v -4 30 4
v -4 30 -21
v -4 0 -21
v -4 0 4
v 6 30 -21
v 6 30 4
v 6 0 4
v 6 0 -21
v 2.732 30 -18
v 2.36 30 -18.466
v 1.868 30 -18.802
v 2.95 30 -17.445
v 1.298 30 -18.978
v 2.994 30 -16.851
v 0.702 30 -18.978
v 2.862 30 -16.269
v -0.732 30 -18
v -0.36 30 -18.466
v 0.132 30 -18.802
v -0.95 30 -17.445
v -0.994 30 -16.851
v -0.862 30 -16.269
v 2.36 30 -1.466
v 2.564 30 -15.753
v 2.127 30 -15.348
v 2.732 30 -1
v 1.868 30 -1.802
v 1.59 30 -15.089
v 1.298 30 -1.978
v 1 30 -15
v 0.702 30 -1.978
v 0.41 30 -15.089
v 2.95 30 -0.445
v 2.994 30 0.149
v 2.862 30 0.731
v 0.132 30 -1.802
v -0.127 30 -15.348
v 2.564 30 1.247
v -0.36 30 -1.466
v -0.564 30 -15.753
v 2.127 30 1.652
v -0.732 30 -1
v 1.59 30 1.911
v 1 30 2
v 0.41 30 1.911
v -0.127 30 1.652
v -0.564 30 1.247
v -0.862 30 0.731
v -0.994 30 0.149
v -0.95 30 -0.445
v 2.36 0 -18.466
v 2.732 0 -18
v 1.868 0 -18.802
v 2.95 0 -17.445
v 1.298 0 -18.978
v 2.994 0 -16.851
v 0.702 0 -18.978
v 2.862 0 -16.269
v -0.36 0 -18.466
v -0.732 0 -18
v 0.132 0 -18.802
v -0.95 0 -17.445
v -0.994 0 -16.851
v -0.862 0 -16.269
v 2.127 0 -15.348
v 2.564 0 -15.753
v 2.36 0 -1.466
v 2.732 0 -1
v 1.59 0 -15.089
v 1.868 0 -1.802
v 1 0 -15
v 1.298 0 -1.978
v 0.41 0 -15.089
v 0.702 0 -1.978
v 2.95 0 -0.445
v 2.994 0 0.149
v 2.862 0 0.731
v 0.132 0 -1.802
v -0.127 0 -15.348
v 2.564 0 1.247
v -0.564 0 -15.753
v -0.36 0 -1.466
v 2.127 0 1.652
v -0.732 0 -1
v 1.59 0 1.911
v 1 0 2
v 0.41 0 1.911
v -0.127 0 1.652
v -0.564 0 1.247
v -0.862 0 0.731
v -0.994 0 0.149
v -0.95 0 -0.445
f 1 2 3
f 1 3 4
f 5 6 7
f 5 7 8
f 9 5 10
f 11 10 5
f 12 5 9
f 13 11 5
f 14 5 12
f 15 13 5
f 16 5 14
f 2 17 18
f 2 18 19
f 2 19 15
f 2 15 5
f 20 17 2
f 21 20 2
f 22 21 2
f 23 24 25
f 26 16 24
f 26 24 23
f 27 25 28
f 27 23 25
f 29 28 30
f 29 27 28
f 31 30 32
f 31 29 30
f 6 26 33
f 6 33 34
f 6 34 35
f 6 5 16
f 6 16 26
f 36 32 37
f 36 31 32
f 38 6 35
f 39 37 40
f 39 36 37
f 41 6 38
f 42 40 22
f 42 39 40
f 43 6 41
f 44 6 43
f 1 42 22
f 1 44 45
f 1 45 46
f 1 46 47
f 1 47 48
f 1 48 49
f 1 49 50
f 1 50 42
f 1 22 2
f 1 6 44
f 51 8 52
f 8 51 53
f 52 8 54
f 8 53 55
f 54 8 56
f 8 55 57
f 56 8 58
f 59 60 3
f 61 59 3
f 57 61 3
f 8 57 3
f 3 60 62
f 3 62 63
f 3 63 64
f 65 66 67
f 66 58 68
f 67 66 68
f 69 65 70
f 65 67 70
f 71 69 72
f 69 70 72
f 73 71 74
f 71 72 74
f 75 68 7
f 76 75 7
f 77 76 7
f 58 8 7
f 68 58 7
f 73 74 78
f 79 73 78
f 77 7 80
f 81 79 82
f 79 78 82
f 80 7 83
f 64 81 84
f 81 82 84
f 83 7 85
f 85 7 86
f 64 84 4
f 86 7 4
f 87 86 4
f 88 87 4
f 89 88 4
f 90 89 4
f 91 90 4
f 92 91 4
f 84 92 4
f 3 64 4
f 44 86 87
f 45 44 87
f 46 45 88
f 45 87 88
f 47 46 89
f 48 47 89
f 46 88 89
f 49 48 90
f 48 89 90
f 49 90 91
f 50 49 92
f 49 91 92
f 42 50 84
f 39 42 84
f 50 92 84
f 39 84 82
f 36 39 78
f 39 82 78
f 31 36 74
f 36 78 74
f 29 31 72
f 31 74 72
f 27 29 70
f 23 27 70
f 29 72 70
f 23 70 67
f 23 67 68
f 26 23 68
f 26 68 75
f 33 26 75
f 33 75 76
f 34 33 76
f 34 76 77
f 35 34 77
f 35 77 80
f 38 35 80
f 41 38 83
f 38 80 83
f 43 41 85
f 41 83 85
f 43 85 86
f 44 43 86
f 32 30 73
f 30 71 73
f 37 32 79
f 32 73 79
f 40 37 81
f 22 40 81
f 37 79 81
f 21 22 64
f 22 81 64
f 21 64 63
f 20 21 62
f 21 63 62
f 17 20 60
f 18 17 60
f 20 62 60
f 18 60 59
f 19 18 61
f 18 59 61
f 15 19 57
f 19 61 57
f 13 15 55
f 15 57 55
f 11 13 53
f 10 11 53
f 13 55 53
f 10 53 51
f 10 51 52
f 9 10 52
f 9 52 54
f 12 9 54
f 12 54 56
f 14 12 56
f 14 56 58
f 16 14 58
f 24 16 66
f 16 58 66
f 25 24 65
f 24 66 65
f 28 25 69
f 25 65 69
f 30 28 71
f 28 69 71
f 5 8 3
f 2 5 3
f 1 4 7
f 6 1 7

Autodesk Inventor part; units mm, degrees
ref_plane "YZ Plane" through (0, 0, 0) normal (1, 0, 0) x (0, 1, 0)
ref_plane "XZ Plane" through (0, 0, 0) normal (0, 1, 0) x (-1, 0, 0)
ref_plane "XY Plane" through (0, 0, 0) normal (0, 0, 1) x (1, 0, 0)
sketch "Sketch1" plane through (0, 0, 0) normal (0, 1, 0) x (-1, 0, 0)
  line L0 (4, 4) -> (-6, 4)
  line L1 (-6, 4) -> (-6, -21)
  line L2 (-6, -21) -> (4, -21)
  line L3 (4, -21) -> (4, 4)
  point P0 (0, 0)
  dimension "d0" = 10
  dimension "d1" = 25
extrude "Extrusion1" add sketch "Sketch1" along normal blind 30
sketch "Sketch2" plane through (0, 30, 0) normal (0, 1, 0) x (1, 0, 0)
  line L0 (1, 28) -> (1, -15) construction
  line L1 (-4, 21) -> (-4, -4) projected
  circle A0 centre (1, 17) radius 2
  circle A1 centre (1, 0) radius 2
  line L2 (-4, -4) -> (6, -4) projected
  point P0 (0, 0)
  dimension "d5" = 5
  dimension "d6" = 4
  dimension "d7" = 4
  dimension "d8" = 17
  dimension "d9" = 4
  dimension "d10" = 25
hole "Hole1" at (1, 30, 0) at (1, 30, -17) direction (0, -1, 0) diameter 4 end through all
equation "\"d9\" = -0.5 * d8 + 0.5 * d10"
properties part number "mocowanie uchwytu02"
